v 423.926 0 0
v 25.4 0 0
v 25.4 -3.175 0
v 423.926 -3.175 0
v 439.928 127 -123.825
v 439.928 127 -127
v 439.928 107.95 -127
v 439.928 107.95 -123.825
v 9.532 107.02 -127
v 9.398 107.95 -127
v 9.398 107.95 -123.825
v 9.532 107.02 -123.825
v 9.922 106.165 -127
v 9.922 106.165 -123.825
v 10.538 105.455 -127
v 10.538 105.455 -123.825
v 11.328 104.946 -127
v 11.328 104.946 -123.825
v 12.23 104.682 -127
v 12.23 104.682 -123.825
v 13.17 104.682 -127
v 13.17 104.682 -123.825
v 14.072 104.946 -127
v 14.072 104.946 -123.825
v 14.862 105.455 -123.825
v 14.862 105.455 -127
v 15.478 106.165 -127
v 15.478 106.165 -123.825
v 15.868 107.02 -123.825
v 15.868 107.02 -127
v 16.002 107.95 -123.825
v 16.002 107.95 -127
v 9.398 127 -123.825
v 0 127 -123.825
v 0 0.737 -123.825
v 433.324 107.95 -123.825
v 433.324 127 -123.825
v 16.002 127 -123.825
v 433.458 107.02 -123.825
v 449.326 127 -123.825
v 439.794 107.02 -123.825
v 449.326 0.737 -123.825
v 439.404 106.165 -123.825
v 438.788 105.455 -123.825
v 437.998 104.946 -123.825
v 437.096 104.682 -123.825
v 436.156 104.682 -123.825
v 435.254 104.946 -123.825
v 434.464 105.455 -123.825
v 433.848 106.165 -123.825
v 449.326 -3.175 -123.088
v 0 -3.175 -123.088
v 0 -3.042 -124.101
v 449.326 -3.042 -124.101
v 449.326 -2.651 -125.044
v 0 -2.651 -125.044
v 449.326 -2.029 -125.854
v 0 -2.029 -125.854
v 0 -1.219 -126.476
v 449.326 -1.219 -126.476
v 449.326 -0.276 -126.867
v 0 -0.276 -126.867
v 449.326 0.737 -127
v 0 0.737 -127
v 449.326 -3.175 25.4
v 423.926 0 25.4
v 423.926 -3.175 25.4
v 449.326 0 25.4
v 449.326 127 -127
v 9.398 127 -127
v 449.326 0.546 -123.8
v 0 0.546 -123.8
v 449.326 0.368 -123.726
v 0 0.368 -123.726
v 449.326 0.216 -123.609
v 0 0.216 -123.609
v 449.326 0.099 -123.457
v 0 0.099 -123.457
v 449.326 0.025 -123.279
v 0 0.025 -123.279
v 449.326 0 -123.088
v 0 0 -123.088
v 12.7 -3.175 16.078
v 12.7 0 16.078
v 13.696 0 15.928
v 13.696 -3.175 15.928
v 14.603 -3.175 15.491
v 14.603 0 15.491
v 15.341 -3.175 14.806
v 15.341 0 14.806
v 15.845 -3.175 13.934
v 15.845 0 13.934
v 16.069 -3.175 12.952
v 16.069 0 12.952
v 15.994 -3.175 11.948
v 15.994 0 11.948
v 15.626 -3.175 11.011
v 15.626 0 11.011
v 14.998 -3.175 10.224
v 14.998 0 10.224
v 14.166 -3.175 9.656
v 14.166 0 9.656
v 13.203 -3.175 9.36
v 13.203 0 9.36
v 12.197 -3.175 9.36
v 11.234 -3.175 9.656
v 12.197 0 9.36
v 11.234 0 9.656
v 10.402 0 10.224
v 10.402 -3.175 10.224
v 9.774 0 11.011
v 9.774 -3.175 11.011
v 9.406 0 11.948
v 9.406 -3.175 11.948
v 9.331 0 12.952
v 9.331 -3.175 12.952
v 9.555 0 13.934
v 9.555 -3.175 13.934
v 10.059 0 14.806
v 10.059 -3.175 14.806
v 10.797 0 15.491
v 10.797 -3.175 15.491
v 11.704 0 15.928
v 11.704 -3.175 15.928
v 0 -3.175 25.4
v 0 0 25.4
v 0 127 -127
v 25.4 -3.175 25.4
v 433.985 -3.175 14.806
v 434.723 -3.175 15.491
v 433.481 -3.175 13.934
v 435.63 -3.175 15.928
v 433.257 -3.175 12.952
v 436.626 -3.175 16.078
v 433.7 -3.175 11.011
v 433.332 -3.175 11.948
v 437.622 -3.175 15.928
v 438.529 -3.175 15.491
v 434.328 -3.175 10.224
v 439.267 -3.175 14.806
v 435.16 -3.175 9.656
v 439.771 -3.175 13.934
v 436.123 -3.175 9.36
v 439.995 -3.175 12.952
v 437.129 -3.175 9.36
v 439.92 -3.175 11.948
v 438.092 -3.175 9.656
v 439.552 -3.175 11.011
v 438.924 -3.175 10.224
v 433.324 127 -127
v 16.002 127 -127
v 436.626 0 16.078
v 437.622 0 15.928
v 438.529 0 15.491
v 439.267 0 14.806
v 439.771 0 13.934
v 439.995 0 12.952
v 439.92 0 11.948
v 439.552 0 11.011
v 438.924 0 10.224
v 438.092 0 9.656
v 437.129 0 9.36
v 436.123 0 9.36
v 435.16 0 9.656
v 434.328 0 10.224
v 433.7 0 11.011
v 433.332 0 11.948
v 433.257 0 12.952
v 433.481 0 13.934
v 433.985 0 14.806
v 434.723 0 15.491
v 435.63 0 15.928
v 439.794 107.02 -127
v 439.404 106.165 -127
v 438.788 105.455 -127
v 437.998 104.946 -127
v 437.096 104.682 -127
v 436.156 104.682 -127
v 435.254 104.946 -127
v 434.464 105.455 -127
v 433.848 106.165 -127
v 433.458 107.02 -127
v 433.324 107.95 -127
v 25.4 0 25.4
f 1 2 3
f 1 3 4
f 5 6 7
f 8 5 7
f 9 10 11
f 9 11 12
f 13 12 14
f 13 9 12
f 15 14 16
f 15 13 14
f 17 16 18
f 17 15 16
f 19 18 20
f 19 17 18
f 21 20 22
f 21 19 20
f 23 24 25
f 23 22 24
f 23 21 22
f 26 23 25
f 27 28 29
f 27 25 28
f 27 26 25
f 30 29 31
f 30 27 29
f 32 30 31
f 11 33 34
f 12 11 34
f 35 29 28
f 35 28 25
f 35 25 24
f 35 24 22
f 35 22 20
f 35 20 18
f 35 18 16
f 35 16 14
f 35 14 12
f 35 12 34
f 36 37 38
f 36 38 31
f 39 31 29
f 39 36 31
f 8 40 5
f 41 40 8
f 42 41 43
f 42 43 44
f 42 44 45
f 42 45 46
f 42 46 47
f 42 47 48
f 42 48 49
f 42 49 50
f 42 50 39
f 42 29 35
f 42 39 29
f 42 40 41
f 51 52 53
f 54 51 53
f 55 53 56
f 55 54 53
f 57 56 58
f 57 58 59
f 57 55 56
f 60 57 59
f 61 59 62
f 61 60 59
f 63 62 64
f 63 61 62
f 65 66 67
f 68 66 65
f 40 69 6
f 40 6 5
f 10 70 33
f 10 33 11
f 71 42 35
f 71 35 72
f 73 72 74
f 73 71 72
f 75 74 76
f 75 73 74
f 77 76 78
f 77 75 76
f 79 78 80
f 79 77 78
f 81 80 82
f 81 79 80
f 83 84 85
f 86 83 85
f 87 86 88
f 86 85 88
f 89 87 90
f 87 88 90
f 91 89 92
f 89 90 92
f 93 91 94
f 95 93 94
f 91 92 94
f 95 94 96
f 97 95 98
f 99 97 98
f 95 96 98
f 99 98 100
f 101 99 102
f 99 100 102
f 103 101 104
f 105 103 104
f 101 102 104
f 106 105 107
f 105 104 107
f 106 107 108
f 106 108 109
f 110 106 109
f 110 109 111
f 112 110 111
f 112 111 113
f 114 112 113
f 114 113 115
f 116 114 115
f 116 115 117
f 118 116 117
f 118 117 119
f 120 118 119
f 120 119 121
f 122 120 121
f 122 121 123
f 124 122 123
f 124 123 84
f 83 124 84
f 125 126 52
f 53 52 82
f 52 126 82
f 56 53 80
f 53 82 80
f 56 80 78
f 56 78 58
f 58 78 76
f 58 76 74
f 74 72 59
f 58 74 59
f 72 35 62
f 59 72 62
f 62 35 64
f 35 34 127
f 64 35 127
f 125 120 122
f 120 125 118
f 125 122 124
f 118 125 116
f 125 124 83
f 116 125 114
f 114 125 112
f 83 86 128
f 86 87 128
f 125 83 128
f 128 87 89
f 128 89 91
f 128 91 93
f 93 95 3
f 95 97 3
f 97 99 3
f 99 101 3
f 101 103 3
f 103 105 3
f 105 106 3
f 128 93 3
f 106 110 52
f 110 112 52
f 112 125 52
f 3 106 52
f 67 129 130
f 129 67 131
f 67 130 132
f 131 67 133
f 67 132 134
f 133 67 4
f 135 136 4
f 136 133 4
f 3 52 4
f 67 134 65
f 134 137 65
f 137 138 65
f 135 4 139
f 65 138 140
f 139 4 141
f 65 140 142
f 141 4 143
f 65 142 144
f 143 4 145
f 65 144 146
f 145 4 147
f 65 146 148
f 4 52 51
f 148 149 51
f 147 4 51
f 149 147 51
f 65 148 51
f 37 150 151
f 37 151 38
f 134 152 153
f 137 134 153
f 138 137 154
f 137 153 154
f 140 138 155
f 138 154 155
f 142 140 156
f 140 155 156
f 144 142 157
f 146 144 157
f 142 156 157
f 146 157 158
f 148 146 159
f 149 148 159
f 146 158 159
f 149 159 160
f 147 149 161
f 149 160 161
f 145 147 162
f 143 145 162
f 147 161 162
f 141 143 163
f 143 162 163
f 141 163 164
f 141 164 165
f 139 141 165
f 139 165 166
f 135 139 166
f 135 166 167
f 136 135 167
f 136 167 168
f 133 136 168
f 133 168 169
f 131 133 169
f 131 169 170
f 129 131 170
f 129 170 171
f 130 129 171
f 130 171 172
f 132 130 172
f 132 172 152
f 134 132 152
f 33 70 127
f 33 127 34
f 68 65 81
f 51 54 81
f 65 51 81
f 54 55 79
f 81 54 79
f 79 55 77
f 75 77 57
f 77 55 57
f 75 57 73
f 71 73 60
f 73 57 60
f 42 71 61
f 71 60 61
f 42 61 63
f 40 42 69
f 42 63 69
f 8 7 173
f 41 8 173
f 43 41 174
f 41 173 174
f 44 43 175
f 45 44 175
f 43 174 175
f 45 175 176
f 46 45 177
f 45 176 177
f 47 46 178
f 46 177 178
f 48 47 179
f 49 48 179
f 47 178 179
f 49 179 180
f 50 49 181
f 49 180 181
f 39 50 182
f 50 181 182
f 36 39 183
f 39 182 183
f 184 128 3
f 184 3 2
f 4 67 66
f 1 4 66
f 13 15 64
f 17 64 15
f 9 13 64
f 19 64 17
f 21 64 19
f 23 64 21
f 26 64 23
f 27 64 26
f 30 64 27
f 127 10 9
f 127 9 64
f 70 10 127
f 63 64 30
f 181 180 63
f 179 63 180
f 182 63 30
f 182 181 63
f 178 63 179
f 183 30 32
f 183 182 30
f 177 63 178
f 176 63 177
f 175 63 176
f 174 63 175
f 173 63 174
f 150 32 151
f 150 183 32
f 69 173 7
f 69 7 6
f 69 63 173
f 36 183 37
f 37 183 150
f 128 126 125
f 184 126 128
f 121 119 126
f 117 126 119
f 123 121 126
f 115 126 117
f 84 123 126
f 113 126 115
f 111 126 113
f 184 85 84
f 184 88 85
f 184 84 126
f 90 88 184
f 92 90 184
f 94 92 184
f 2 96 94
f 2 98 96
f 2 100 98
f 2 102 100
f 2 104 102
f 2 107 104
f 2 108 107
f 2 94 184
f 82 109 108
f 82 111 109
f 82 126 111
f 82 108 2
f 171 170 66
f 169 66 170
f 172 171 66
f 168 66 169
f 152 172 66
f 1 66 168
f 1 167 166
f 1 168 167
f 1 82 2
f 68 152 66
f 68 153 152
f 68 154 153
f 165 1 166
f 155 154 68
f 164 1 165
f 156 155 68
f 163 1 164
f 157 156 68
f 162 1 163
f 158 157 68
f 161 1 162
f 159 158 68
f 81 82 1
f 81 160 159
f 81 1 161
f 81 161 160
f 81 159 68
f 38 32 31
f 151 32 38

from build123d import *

# Parameters (mm, degrees)
SKETCH1_W                    = 449.326
SKETCH1_H                    = 127
BASE_FLANGE1_DEPTH           = 3.175
EDGE_FLANGE1_STRIP_W         = 14.1732
EDGE_FLANGE1_STRIP_H         = 3.175
EDGE_FLANGE1_STRIP_CUT_DEPTH = 449.326
EDGE_FLANGE1_DEPTH           = 449.326
CUT_EXTRUDE1_DEPTH           = 484.892399482
SKETCH10_W                   = 25.4
SKETCH10_H                   = 3.175
BOSS_EXTRUDE1_DEPTH          = 25.4
F_1_4_CLEARANCE_HOLE1_D      = 6.7564
F_1_4_CLEARANCE_HOLE1_DEPTH  = 25.4
F_1_4_CLEARANCE_HOLE1_TIP    = 2.029827343


# Sheet-metal steps are written as plain solids
with BuildPart() as part:
    # Sketch1 → Base-Flange1 (new body)
    with BuildSketch(Plane(origin=(0, 0, 0), x_dir=(1, 0, 0), z_dir=(0, 1, 0))):
        with Locations((224.663, 63.5)):
            Rectangle(SKETCH1_W, SKETCH1_H)
    extrude(amount=-BASE_FLANGE1_DEPTH)

    # Edge-Flange1 strip (across the edge) → Edge-Flange1 strip cut (cut)
    with BuildSketch(Plane(origin=(449.326, 0, -127), x_dir=(0, 0, 1), z_dir=(-1, 0, 0))):
        with Locations((-3.175, -1.5875)):
            Rectangle(EDGE_FLANGE1_STRIP_W, EDGE_FLANGE1_STRIP_H)
    extrude(amount=EDGE_FLANGE1_STRIP_CUT_DEPTH, mode=Mode.SUBTRACT)

    # Edge-Flange1 section (across the edge) → Edge-Flange1 (add)
    with BuildSketch(Plane(origin=(449.326, 0, -127), x_dir=(0, 0, 1), z_dir=(-1, 0, 0))):
        with BuildLine():
            Line((0, 0.7366), (0, 127))
            Line((0, 127), (3.175, 127))
            Line((3.175, 127), (3.175, 0.7366))
            ThreePointArc((3.175, 0.7366), (3.390745145, 0.215745145), (3.9116, 0))
            Line((3.9116, 0), (3.9116, -3.175))
            ThreePointArc((3.9116, -3.175), (1.145681115, -2.029318885), (0, 0.7366))
        make_face()
    extrude(amount=EDGE_FLANGE1_DEPTH)

    # Sketch9 → Cut-Extrude1 (cut, through all)
    with BuildSketch(Plane(origin=(0, 0, -127), x_dir=(-1, 0, 0), z_dir=(0, 0, -1))):
        with BuildLine():
            Line((-433.324, 107.95), (-433.324, 127))
            Line((-433.324, 127), (-439.928, 127))
            Line((-439.928, 127), (-439.928, 107.95))
            ThreePointArc((-439.928, 107.95), (-436.626, 104.648), (-433.324, 107.95))
        make_face()
        with BuildLine():
            Line((-16.002, 107.95), (-16.002, 127))
            Line((-16.002, 127), (-9.398, 127))
            Line((-9.398, 127), (-9.398, 107.95))
            ThreePointArc((-9.398, 107.95), (-12.7, 104.648), (-16.002, 107.95))
        make_face()
    extrude(amount=-CUT_EXTRUDE1_DEPTH, mode=Mode.SUBTRACT)

    # Sketch10 → Boss-Extrude1 (add)
    with BuildSketch(Plane.XY):
        with Locations((436.626, -1.5875)):
            Rectangle(SKETCH10_W, SKETCH10_H)
        with Locations((12.7, -1.5875)):
            Rectangle(SKETCH10_W, SKETCH10_H)
    extrude(amount=BOSS_EXTRUDE1_DEPTH)

    # 1/4 Clearance Hole1
    with Locations(Plane(origin=(12.7, -3.175, 12.7), x_dir=(0, 0, -1), z_dir=(0, -1, 0))):
        with Locations((0, 0), (0, 423.926)):
            Hole(F_1_4_CLEARANCE_HOLE1_D / 2, depth=F_1_4_CLEARANCE_HOLE1_DEPTH)
            with Locations((0, 0, -(F_1_4_CLEARANCE_HOLE1_DEPTH + F_1_4_CLEARANCE_HOLE1_TIP / 2))):  # 118° drill point
                Cone(0, F_1_4_CLEARANCE_HOLE1_D / 2, F_1_4_CLEARANCE_HOLE1_TIP, mode=Mode.SUBTRACT)


solid = part.part
